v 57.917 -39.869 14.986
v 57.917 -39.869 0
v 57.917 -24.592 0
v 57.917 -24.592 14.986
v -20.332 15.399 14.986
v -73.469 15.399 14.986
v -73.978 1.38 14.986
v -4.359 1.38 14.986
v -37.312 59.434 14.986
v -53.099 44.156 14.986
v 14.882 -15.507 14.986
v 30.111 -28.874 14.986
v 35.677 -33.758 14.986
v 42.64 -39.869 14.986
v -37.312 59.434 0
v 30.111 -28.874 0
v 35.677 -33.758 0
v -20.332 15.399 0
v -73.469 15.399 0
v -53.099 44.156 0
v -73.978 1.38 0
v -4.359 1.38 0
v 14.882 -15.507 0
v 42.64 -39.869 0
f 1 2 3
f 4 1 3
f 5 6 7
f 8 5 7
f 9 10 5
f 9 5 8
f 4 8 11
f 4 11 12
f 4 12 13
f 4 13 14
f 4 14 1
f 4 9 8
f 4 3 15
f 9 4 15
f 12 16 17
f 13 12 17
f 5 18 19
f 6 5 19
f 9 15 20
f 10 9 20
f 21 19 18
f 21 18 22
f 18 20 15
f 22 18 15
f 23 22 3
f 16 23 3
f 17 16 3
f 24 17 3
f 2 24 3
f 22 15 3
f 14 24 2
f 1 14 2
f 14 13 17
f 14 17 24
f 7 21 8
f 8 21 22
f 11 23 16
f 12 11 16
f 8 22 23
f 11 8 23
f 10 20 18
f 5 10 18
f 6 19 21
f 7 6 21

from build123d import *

# Parameters (mm, degrees)
F1_DEPTH = 14.986


with BuildPart() as f1:
    # F0 (on Top) → F1 (new body)
    with BuildSketch(Plane.XY):
        Polygon((57.917436, -24.592009), (-37.311969, 59.433942), (-53.098663, 44.156493), (-20.332476, 15.398937), (-4.358985, 1.37965), (14.88192, -15.507314), (30.111295, -28.87352), (35.677184, -33.758476), (42.639993, -39.869452), (57.917436, -39.869452), align=None)
        Polygon((-4.358985, 1.37965), (-20.332476, 15.398937), (-73.468593, 15.398937), (-73.97784, 1.37965), align=None)
    extrude(amount=F1_DEPTH)


solid = f1.part
